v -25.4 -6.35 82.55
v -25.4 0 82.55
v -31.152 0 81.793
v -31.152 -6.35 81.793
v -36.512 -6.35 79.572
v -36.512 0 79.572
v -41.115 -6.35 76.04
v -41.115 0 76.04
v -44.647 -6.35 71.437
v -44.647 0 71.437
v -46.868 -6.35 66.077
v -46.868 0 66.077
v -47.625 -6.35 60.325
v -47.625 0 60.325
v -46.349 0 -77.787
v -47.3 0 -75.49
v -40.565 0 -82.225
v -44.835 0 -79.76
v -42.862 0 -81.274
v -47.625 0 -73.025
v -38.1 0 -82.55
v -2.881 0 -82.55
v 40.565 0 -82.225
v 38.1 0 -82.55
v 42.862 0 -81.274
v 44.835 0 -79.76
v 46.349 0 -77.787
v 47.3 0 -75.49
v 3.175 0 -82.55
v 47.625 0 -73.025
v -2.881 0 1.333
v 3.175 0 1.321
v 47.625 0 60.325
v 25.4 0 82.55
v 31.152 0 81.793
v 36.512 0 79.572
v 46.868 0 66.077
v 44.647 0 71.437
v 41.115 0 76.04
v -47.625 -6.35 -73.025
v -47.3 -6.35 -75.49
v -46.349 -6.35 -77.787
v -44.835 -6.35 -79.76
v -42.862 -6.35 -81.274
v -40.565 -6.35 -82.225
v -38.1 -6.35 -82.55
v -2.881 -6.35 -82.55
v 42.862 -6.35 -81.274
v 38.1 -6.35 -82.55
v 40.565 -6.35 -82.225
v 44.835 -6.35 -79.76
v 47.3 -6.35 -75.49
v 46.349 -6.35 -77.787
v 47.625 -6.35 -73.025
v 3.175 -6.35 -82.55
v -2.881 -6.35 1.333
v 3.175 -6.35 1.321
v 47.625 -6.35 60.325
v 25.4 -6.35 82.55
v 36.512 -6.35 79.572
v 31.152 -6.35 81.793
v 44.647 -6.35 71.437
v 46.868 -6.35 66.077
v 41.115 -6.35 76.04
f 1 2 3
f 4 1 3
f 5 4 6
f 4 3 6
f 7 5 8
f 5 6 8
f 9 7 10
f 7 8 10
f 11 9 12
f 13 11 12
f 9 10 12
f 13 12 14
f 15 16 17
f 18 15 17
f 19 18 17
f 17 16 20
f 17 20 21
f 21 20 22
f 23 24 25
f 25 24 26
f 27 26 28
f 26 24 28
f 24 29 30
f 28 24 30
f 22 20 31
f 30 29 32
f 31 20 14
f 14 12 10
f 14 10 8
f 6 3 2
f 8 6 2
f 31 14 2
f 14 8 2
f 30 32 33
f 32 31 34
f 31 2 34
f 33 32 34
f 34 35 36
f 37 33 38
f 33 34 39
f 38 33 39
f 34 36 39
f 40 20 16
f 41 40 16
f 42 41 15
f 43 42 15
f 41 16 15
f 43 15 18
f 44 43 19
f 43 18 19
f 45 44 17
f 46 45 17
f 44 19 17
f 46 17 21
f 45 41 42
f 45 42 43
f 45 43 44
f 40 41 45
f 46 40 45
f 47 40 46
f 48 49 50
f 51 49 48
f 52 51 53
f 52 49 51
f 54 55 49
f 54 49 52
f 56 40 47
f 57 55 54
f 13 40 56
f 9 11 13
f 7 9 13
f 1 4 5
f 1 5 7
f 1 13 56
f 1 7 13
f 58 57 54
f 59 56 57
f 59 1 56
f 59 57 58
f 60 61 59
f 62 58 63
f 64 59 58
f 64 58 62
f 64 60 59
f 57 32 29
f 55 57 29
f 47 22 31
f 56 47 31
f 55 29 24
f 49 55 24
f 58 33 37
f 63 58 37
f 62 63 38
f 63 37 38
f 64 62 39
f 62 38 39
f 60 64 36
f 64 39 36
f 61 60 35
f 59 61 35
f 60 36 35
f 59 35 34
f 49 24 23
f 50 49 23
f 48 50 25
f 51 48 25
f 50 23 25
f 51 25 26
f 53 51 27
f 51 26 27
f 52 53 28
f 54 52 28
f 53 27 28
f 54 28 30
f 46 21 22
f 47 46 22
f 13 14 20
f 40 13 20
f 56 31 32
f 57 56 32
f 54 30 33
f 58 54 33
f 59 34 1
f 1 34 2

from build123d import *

# Parameters (mm, degrees)
F1_DEPTH = 6.35


with BuildPart() as f1:
    # F0 (on Front) → F1 (new body)
    with BuildSketch(Plane.XZ):
        with BuildLine():
            Line((3.175, -82.55), (38.1, -82.55))
            ThreePointArc((38.1, -82.55), (44.835192, -79.760192), (47.625, -73.025))
            Line((47.625, -73.025), (47.625, 60.325))
            ThreePointArc((47.625, 60.325), (41.115448, 76.040448), (25.4, 82.55))
            Line((25.4, 82.55), (3.175, 82.55))
            Line((3.175, 82.55), (-2.881412, 82.55))
            Line((-2.881412, 82.55), (-25.4, 82.55))
            ThreePointArc((-25.4, 82.55), (-41.115448, 76.040448), (-47.625, 60.325))
            Line((-47.625, 60.325), (-47.625, -73.025))
            ThreePointArc((-47.625, -73.025), (-44.835192, -79.760192), (-38.1, -82.55))
            Line((-38.1, -82.55), (-2.881412, -82.55))
            Line((-2.881412, -82.55), (-2.881412, 1.333451))
            Line((-2.881412, 1.333451), (3.175, 1.3208))
            Line((3.175, 1.3208), (3.175, -82.55))
        make_face()
    extrude(amount=F1_DEPTH)


solid = f1.part
